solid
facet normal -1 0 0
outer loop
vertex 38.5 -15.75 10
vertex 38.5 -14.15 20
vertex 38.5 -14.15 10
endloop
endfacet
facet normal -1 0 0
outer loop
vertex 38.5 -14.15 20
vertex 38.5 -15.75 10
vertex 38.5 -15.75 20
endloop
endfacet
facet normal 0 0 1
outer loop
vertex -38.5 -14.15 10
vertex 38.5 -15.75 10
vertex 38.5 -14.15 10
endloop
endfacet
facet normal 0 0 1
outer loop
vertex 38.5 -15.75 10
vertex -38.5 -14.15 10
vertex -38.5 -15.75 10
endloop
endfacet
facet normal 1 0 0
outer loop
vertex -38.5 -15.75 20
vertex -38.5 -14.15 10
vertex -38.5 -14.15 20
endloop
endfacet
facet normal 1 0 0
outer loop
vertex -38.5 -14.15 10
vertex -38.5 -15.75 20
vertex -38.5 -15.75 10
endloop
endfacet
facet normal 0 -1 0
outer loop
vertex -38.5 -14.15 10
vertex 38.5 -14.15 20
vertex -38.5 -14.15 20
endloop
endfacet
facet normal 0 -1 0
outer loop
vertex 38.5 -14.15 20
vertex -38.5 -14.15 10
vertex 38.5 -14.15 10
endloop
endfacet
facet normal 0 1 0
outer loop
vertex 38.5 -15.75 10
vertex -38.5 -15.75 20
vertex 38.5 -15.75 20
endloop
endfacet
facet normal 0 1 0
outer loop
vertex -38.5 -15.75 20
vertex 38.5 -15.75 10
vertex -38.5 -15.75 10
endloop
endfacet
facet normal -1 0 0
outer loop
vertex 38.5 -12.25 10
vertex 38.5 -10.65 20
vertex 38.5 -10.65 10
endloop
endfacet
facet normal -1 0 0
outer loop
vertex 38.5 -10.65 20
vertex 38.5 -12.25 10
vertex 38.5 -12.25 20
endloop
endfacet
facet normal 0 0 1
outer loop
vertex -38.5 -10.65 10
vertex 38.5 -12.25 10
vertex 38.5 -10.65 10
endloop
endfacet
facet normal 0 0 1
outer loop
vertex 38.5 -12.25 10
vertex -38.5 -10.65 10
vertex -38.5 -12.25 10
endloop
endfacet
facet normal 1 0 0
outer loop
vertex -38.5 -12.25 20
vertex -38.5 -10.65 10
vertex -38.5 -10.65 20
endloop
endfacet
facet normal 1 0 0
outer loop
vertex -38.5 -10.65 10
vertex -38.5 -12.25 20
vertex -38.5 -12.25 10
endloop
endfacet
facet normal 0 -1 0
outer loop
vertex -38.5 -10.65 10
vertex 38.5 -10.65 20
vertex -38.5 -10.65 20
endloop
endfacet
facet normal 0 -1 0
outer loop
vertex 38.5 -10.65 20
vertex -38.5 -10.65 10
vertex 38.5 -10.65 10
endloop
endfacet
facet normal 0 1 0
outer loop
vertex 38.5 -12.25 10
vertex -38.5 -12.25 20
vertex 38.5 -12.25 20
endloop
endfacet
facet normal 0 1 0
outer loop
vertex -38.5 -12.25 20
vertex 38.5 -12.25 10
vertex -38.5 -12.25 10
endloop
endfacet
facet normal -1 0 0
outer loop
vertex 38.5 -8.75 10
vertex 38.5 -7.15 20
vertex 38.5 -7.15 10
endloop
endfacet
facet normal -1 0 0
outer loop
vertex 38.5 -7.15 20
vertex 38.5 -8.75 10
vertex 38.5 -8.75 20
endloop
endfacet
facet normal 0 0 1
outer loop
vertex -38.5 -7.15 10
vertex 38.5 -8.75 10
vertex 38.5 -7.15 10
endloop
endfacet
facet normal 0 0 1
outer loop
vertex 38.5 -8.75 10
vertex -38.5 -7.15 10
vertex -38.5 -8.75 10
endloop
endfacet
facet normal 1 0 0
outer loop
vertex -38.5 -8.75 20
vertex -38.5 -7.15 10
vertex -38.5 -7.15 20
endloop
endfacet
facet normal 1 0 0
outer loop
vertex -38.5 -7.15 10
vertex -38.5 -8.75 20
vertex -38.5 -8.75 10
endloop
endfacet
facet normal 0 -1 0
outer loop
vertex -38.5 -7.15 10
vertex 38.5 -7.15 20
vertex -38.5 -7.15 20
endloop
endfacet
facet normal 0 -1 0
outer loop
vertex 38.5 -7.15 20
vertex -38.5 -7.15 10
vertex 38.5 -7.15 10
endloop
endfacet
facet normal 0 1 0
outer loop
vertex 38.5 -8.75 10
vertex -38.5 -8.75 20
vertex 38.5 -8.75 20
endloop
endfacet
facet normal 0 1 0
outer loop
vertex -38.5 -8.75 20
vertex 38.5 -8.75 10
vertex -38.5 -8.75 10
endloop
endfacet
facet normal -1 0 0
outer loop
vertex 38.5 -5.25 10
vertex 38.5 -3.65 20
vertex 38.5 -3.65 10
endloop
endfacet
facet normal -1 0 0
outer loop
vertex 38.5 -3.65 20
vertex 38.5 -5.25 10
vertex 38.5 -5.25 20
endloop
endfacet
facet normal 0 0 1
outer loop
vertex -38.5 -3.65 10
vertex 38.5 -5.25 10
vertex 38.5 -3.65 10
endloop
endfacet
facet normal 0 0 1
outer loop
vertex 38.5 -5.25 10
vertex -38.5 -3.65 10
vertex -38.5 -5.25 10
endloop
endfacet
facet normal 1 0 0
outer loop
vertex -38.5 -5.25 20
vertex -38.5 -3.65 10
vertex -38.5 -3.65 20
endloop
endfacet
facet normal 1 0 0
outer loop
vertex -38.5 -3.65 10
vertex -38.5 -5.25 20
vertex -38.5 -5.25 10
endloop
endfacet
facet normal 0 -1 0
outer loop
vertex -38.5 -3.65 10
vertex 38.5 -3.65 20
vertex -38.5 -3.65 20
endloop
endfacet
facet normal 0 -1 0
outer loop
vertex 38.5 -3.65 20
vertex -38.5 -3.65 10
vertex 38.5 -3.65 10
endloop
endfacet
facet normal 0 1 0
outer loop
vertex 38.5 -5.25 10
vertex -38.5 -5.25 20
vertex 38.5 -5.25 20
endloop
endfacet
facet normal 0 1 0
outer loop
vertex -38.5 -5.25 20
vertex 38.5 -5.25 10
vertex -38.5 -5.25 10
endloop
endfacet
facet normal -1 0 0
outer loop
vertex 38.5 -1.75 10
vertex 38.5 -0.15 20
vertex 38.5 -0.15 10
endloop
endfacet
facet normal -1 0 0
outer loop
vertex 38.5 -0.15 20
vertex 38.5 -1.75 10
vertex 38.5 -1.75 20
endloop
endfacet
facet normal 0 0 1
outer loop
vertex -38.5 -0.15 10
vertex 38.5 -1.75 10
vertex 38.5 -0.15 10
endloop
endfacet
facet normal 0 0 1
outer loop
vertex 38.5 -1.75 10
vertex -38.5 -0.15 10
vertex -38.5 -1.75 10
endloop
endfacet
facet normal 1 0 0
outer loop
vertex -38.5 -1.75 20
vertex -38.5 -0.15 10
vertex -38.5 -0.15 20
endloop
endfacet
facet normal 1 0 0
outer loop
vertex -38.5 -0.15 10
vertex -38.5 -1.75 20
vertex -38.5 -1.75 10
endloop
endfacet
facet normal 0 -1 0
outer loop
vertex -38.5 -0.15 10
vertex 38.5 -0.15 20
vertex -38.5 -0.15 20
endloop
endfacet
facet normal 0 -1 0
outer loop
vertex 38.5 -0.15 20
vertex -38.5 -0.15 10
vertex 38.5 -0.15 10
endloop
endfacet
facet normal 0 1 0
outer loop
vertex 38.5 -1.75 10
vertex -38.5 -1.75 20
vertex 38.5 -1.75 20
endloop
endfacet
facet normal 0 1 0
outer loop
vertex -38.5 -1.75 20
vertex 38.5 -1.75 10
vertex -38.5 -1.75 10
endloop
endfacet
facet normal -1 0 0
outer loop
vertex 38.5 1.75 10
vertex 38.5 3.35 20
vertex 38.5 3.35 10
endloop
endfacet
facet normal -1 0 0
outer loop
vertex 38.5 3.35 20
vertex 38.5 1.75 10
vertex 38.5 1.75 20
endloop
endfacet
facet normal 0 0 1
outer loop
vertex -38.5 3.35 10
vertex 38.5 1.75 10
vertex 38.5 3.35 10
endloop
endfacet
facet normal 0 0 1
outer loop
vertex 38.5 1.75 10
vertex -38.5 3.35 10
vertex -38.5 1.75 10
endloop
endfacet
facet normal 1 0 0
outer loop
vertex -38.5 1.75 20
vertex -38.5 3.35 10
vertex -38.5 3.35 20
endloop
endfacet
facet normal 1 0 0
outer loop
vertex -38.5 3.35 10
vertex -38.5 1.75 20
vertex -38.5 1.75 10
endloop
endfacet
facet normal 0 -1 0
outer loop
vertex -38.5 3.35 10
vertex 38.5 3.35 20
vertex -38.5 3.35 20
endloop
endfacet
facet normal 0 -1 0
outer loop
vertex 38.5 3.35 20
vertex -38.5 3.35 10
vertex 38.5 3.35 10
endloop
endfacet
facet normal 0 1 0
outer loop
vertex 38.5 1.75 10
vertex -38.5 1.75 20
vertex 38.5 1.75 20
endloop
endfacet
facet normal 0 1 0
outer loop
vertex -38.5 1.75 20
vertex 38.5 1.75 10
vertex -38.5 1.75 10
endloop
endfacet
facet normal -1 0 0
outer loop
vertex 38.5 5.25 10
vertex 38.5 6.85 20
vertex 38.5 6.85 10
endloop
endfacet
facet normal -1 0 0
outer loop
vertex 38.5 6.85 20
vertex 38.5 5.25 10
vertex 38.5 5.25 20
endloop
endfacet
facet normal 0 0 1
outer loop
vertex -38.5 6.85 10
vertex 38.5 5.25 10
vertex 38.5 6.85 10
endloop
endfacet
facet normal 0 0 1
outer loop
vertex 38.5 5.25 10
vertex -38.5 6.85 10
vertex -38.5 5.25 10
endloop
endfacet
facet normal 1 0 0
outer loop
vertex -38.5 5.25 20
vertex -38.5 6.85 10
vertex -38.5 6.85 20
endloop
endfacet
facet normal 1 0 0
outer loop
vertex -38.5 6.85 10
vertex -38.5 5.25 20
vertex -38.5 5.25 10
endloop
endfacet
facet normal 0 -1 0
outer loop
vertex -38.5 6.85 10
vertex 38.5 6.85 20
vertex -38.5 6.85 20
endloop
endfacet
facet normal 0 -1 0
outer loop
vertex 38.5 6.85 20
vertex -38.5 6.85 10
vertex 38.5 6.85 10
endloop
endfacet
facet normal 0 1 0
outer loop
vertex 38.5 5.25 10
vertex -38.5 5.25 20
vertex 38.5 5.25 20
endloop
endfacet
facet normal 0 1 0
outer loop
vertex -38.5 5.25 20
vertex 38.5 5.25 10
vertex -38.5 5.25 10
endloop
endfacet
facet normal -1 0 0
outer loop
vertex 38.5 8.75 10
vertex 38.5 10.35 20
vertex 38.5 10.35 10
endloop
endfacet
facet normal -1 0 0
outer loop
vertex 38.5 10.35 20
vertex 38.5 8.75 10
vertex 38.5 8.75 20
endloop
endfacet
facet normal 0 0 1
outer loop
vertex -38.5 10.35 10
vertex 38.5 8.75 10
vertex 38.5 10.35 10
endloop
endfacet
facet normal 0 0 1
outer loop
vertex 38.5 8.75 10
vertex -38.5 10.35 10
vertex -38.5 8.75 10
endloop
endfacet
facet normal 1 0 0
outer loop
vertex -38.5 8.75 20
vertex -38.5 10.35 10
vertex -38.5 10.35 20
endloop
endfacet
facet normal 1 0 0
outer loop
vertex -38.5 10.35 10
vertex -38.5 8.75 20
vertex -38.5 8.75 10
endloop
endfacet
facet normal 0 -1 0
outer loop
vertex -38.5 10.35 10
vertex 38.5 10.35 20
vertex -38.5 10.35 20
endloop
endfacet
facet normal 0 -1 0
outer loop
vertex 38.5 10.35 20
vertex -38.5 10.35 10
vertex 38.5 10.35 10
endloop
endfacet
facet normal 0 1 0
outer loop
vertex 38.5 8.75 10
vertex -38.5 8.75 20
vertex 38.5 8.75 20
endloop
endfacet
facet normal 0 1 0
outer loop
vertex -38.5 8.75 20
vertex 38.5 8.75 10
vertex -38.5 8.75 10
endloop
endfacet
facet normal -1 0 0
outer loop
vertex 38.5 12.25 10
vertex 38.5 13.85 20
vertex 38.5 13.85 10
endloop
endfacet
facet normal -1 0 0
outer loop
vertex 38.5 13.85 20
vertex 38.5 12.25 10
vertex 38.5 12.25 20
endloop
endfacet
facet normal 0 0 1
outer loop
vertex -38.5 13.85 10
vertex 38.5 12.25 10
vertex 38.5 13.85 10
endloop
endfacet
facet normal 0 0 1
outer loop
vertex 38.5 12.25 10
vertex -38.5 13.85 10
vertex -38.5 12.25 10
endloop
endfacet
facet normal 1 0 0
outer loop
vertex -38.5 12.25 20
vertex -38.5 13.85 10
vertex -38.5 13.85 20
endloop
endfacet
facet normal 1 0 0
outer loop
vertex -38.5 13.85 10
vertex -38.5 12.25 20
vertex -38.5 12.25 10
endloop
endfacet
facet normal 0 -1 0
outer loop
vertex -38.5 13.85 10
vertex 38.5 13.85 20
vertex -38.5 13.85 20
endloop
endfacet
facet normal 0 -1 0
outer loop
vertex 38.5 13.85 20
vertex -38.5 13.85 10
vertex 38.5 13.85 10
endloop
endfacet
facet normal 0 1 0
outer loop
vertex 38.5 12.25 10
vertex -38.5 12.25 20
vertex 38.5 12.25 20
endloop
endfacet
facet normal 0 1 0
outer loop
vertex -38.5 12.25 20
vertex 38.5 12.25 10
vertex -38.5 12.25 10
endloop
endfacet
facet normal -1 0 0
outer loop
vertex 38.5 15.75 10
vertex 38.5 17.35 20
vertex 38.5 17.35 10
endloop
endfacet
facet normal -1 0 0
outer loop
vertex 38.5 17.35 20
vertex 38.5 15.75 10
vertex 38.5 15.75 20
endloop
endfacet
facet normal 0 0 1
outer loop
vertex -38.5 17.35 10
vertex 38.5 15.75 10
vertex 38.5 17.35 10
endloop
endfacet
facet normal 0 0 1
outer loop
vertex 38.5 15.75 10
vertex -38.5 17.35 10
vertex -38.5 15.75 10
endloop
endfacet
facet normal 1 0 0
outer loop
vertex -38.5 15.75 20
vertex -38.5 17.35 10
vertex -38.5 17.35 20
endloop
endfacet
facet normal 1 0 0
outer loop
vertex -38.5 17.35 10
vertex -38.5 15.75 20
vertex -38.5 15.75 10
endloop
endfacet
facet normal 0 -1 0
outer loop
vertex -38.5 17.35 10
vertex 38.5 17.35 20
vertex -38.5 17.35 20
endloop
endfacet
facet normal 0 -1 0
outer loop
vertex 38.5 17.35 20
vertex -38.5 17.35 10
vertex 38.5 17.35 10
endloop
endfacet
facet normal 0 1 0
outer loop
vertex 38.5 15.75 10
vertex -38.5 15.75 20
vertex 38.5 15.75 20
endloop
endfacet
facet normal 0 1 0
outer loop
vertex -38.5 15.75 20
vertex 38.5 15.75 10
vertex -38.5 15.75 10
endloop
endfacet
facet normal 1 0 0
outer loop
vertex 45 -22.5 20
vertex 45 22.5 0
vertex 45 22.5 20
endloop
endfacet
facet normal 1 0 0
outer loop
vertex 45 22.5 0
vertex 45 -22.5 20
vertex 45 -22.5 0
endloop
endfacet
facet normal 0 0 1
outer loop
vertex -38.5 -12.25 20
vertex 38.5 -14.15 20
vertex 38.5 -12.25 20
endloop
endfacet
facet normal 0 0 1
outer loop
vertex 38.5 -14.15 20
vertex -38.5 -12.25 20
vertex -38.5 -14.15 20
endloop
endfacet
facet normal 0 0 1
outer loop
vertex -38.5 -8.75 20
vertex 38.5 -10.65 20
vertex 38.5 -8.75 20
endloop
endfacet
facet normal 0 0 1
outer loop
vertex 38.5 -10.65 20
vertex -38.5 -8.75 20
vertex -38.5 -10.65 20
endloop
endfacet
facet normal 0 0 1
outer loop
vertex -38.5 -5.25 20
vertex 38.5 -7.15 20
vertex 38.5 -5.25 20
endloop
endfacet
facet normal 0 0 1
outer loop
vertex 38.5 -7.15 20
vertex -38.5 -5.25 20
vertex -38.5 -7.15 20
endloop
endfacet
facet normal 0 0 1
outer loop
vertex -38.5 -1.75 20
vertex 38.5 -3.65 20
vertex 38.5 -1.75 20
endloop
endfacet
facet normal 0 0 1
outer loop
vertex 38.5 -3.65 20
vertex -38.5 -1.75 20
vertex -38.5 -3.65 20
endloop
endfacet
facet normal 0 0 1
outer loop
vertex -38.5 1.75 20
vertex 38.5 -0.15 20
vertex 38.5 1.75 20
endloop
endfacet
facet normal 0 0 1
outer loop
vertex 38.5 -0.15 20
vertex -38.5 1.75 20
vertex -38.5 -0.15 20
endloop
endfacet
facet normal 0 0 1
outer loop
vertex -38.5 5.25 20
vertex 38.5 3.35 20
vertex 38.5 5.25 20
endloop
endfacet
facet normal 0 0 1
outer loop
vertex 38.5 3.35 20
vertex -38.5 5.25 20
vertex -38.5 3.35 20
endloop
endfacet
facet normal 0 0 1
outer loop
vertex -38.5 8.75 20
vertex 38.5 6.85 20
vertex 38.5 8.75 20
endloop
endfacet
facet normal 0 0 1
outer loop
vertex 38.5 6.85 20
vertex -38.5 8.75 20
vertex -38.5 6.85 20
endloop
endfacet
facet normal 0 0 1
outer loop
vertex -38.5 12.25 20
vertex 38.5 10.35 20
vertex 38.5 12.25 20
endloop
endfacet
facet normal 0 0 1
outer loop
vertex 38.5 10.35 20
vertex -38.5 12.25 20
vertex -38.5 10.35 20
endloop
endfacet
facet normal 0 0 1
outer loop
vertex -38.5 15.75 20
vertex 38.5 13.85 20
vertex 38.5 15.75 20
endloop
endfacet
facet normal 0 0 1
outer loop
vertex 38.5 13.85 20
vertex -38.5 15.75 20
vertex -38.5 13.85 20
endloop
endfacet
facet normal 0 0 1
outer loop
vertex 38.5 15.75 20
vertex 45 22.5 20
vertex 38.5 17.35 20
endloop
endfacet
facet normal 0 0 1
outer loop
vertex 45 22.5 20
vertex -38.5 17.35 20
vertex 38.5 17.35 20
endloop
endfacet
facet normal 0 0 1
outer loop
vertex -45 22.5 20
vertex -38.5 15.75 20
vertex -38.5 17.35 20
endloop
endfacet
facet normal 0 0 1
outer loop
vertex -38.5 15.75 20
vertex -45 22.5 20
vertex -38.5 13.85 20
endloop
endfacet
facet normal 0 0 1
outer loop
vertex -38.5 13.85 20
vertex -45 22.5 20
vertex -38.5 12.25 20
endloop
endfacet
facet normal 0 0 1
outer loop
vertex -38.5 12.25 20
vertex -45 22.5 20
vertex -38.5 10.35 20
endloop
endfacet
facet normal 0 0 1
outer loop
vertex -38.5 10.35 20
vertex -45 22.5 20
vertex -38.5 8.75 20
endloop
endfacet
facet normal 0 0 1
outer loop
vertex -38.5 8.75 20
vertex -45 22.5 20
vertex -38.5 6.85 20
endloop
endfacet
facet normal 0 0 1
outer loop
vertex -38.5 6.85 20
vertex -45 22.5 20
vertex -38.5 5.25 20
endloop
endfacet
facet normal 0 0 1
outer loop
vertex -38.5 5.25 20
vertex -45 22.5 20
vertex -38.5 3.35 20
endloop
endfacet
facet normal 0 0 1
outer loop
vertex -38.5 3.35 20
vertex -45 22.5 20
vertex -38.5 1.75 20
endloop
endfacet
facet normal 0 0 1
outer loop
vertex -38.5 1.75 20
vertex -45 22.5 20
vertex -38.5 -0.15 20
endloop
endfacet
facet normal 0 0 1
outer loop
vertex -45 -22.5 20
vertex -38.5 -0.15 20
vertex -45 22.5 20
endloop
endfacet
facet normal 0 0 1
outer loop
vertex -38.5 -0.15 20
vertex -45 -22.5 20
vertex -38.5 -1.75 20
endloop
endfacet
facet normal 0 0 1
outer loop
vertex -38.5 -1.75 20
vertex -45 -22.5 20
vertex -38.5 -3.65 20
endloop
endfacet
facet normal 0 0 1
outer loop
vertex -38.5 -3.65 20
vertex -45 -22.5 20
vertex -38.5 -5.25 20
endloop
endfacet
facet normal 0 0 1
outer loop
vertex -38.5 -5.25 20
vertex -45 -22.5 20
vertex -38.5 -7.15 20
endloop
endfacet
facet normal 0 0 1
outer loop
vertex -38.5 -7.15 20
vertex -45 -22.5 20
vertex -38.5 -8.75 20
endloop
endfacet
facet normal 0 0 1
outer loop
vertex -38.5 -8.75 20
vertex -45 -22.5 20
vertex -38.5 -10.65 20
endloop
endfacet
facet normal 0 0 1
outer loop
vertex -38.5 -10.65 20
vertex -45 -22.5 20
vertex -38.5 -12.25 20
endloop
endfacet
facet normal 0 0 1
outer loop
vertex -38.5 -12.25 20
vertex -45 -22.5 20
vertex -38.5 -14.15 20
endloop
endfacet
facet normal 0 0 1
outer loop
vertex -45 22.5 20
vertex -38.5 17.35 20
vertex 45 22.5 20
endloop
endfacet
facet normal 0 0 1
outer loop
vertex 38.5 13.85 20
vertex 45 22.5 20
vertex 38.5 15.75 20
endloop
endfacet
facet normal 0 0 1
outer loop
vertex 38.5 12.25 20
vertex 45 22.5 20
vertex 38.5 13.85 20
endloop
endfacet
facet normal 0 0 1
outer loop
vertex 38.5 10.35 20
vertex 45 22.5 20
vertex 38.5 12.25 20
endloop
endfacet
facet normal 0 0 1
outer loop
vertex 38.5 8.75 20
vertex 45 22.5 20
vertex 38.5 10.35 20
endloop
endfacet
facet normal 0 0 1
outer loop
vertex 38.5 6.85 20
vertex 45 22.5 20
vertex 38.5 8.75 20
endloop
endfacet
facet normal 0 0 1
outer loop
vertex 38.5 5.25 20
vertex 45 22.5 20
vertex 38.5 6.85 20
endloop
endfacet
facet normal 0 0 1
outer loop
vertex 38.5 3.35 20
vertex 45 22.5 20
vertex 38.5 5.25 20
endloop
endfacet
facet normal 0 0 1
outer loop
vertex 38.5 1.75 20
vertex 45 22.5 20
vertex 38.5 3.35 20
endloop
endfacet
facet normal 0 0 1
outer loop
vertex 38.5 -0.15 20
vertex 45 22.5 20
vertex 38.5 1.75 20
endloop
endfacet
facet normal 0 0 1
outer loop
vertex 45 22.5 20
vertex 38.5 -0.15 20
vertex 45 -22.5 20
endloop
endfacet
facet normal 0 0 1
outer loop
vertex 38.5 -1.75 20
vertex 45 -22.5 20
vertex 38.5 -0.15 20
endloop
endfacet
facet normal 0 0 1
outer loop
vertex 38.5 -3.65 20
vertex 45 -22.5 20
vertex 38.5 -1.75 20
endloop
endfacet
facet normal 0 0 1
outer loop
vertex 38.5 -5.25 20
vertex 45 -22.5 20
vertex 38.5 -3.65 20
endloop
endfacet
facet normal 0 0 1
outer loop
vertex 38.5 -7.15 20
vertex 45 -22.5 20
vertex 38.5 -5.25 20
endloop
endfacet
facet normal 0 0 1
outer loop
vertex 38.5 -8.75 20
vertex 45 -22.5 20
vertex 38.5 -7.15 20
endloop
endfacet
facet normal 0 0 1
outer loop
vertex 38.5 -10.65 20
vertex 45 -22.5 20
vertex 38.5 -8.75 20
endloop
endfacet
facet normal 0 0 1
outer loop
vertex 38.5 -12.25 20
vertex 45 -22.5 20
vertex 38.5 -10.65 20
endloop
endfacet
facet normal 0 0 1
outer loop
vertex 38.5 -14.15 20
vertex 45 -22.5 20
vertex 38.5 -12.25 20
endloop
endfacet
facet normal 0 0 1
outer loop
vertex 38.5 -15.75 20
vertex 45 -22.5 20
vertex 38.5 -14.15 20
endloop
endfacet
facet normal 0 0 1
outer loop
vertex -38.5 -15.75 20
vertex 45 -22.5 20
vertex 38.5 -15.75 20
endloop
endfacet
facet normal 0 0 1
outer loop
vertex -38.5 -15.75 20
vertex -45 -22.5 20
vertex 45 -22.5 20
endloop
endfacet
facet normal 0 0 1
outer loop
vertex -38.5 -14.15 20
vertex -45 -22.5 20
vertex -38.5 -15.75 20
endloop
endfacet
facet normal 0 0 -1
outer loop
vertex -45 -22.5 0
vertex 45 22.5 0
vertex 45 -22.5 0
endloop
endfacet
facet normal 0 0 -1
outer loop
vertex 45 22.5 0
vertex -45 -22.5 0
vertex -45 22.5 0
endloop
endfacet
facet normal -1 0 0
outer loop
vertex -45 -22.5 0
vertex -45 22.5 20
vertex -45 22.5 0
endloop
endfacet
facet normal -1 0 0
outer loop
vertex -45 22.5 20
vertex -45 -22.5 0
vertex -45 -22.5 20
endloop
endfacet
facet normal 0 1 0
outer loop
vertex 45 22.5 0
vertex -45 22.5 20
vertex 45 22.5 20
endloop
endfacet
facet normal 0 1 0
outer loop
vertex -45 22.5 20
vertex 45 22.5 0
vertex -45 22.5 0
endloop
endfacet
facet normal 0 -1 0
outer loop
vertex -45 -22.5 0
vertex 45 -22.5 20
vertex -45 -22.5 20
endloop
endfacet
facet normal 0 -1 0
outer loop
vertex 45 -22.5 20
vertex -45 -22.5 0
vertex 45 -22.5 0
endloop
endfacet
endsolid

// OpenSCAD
// Microscope slide drying rack
// Print orientation: base block on XY plane, slots open upward (+Z)

// ---------- Parameters ----------
block_len   = 90;    // block length along X (mm)
block_wid   = 45;    // block width along Y (mm)
block_ht    = 20;    // block height along Z (mm)

slot_count  = 10;    // number of slide slots
slot_len    = 77;    // slot length along X (mm)
slot_wid    = 1.6;   // slot width along Y (mm)
slot_depth  = 10;    // slot depth from top face (mm)
slot_pitch  = 3.5;   // centre-to-centre slot spacing along Y (mm)

eps         = 0.5;   // overcut past faces to avoid coplanar surfaces (mm)

$fn = 64;

// ---------- Derived ----------
slot_x0 = -(slot_len / 2);          // first slot start in X
slot_y0 = -(slot_count - 1) * slot_pitch / 2;  // first slot centre in Y (group centred)

// ---------- Model ----------
difference() {
    // Base block
    translate([-block_len / 2, -block_wid / 2, 0])
        cube([block_len, block_wid, block_ht]);

    // Parallel slots, open at the top
    for (i = [0 : slot_count - 1]) {
        translate([slot_x0, slot_y0 + i * slot_pitch, block_ht - slot_depth])
            cube([slot_len, slot_wid, slot_depth + eps]);
    }
}
